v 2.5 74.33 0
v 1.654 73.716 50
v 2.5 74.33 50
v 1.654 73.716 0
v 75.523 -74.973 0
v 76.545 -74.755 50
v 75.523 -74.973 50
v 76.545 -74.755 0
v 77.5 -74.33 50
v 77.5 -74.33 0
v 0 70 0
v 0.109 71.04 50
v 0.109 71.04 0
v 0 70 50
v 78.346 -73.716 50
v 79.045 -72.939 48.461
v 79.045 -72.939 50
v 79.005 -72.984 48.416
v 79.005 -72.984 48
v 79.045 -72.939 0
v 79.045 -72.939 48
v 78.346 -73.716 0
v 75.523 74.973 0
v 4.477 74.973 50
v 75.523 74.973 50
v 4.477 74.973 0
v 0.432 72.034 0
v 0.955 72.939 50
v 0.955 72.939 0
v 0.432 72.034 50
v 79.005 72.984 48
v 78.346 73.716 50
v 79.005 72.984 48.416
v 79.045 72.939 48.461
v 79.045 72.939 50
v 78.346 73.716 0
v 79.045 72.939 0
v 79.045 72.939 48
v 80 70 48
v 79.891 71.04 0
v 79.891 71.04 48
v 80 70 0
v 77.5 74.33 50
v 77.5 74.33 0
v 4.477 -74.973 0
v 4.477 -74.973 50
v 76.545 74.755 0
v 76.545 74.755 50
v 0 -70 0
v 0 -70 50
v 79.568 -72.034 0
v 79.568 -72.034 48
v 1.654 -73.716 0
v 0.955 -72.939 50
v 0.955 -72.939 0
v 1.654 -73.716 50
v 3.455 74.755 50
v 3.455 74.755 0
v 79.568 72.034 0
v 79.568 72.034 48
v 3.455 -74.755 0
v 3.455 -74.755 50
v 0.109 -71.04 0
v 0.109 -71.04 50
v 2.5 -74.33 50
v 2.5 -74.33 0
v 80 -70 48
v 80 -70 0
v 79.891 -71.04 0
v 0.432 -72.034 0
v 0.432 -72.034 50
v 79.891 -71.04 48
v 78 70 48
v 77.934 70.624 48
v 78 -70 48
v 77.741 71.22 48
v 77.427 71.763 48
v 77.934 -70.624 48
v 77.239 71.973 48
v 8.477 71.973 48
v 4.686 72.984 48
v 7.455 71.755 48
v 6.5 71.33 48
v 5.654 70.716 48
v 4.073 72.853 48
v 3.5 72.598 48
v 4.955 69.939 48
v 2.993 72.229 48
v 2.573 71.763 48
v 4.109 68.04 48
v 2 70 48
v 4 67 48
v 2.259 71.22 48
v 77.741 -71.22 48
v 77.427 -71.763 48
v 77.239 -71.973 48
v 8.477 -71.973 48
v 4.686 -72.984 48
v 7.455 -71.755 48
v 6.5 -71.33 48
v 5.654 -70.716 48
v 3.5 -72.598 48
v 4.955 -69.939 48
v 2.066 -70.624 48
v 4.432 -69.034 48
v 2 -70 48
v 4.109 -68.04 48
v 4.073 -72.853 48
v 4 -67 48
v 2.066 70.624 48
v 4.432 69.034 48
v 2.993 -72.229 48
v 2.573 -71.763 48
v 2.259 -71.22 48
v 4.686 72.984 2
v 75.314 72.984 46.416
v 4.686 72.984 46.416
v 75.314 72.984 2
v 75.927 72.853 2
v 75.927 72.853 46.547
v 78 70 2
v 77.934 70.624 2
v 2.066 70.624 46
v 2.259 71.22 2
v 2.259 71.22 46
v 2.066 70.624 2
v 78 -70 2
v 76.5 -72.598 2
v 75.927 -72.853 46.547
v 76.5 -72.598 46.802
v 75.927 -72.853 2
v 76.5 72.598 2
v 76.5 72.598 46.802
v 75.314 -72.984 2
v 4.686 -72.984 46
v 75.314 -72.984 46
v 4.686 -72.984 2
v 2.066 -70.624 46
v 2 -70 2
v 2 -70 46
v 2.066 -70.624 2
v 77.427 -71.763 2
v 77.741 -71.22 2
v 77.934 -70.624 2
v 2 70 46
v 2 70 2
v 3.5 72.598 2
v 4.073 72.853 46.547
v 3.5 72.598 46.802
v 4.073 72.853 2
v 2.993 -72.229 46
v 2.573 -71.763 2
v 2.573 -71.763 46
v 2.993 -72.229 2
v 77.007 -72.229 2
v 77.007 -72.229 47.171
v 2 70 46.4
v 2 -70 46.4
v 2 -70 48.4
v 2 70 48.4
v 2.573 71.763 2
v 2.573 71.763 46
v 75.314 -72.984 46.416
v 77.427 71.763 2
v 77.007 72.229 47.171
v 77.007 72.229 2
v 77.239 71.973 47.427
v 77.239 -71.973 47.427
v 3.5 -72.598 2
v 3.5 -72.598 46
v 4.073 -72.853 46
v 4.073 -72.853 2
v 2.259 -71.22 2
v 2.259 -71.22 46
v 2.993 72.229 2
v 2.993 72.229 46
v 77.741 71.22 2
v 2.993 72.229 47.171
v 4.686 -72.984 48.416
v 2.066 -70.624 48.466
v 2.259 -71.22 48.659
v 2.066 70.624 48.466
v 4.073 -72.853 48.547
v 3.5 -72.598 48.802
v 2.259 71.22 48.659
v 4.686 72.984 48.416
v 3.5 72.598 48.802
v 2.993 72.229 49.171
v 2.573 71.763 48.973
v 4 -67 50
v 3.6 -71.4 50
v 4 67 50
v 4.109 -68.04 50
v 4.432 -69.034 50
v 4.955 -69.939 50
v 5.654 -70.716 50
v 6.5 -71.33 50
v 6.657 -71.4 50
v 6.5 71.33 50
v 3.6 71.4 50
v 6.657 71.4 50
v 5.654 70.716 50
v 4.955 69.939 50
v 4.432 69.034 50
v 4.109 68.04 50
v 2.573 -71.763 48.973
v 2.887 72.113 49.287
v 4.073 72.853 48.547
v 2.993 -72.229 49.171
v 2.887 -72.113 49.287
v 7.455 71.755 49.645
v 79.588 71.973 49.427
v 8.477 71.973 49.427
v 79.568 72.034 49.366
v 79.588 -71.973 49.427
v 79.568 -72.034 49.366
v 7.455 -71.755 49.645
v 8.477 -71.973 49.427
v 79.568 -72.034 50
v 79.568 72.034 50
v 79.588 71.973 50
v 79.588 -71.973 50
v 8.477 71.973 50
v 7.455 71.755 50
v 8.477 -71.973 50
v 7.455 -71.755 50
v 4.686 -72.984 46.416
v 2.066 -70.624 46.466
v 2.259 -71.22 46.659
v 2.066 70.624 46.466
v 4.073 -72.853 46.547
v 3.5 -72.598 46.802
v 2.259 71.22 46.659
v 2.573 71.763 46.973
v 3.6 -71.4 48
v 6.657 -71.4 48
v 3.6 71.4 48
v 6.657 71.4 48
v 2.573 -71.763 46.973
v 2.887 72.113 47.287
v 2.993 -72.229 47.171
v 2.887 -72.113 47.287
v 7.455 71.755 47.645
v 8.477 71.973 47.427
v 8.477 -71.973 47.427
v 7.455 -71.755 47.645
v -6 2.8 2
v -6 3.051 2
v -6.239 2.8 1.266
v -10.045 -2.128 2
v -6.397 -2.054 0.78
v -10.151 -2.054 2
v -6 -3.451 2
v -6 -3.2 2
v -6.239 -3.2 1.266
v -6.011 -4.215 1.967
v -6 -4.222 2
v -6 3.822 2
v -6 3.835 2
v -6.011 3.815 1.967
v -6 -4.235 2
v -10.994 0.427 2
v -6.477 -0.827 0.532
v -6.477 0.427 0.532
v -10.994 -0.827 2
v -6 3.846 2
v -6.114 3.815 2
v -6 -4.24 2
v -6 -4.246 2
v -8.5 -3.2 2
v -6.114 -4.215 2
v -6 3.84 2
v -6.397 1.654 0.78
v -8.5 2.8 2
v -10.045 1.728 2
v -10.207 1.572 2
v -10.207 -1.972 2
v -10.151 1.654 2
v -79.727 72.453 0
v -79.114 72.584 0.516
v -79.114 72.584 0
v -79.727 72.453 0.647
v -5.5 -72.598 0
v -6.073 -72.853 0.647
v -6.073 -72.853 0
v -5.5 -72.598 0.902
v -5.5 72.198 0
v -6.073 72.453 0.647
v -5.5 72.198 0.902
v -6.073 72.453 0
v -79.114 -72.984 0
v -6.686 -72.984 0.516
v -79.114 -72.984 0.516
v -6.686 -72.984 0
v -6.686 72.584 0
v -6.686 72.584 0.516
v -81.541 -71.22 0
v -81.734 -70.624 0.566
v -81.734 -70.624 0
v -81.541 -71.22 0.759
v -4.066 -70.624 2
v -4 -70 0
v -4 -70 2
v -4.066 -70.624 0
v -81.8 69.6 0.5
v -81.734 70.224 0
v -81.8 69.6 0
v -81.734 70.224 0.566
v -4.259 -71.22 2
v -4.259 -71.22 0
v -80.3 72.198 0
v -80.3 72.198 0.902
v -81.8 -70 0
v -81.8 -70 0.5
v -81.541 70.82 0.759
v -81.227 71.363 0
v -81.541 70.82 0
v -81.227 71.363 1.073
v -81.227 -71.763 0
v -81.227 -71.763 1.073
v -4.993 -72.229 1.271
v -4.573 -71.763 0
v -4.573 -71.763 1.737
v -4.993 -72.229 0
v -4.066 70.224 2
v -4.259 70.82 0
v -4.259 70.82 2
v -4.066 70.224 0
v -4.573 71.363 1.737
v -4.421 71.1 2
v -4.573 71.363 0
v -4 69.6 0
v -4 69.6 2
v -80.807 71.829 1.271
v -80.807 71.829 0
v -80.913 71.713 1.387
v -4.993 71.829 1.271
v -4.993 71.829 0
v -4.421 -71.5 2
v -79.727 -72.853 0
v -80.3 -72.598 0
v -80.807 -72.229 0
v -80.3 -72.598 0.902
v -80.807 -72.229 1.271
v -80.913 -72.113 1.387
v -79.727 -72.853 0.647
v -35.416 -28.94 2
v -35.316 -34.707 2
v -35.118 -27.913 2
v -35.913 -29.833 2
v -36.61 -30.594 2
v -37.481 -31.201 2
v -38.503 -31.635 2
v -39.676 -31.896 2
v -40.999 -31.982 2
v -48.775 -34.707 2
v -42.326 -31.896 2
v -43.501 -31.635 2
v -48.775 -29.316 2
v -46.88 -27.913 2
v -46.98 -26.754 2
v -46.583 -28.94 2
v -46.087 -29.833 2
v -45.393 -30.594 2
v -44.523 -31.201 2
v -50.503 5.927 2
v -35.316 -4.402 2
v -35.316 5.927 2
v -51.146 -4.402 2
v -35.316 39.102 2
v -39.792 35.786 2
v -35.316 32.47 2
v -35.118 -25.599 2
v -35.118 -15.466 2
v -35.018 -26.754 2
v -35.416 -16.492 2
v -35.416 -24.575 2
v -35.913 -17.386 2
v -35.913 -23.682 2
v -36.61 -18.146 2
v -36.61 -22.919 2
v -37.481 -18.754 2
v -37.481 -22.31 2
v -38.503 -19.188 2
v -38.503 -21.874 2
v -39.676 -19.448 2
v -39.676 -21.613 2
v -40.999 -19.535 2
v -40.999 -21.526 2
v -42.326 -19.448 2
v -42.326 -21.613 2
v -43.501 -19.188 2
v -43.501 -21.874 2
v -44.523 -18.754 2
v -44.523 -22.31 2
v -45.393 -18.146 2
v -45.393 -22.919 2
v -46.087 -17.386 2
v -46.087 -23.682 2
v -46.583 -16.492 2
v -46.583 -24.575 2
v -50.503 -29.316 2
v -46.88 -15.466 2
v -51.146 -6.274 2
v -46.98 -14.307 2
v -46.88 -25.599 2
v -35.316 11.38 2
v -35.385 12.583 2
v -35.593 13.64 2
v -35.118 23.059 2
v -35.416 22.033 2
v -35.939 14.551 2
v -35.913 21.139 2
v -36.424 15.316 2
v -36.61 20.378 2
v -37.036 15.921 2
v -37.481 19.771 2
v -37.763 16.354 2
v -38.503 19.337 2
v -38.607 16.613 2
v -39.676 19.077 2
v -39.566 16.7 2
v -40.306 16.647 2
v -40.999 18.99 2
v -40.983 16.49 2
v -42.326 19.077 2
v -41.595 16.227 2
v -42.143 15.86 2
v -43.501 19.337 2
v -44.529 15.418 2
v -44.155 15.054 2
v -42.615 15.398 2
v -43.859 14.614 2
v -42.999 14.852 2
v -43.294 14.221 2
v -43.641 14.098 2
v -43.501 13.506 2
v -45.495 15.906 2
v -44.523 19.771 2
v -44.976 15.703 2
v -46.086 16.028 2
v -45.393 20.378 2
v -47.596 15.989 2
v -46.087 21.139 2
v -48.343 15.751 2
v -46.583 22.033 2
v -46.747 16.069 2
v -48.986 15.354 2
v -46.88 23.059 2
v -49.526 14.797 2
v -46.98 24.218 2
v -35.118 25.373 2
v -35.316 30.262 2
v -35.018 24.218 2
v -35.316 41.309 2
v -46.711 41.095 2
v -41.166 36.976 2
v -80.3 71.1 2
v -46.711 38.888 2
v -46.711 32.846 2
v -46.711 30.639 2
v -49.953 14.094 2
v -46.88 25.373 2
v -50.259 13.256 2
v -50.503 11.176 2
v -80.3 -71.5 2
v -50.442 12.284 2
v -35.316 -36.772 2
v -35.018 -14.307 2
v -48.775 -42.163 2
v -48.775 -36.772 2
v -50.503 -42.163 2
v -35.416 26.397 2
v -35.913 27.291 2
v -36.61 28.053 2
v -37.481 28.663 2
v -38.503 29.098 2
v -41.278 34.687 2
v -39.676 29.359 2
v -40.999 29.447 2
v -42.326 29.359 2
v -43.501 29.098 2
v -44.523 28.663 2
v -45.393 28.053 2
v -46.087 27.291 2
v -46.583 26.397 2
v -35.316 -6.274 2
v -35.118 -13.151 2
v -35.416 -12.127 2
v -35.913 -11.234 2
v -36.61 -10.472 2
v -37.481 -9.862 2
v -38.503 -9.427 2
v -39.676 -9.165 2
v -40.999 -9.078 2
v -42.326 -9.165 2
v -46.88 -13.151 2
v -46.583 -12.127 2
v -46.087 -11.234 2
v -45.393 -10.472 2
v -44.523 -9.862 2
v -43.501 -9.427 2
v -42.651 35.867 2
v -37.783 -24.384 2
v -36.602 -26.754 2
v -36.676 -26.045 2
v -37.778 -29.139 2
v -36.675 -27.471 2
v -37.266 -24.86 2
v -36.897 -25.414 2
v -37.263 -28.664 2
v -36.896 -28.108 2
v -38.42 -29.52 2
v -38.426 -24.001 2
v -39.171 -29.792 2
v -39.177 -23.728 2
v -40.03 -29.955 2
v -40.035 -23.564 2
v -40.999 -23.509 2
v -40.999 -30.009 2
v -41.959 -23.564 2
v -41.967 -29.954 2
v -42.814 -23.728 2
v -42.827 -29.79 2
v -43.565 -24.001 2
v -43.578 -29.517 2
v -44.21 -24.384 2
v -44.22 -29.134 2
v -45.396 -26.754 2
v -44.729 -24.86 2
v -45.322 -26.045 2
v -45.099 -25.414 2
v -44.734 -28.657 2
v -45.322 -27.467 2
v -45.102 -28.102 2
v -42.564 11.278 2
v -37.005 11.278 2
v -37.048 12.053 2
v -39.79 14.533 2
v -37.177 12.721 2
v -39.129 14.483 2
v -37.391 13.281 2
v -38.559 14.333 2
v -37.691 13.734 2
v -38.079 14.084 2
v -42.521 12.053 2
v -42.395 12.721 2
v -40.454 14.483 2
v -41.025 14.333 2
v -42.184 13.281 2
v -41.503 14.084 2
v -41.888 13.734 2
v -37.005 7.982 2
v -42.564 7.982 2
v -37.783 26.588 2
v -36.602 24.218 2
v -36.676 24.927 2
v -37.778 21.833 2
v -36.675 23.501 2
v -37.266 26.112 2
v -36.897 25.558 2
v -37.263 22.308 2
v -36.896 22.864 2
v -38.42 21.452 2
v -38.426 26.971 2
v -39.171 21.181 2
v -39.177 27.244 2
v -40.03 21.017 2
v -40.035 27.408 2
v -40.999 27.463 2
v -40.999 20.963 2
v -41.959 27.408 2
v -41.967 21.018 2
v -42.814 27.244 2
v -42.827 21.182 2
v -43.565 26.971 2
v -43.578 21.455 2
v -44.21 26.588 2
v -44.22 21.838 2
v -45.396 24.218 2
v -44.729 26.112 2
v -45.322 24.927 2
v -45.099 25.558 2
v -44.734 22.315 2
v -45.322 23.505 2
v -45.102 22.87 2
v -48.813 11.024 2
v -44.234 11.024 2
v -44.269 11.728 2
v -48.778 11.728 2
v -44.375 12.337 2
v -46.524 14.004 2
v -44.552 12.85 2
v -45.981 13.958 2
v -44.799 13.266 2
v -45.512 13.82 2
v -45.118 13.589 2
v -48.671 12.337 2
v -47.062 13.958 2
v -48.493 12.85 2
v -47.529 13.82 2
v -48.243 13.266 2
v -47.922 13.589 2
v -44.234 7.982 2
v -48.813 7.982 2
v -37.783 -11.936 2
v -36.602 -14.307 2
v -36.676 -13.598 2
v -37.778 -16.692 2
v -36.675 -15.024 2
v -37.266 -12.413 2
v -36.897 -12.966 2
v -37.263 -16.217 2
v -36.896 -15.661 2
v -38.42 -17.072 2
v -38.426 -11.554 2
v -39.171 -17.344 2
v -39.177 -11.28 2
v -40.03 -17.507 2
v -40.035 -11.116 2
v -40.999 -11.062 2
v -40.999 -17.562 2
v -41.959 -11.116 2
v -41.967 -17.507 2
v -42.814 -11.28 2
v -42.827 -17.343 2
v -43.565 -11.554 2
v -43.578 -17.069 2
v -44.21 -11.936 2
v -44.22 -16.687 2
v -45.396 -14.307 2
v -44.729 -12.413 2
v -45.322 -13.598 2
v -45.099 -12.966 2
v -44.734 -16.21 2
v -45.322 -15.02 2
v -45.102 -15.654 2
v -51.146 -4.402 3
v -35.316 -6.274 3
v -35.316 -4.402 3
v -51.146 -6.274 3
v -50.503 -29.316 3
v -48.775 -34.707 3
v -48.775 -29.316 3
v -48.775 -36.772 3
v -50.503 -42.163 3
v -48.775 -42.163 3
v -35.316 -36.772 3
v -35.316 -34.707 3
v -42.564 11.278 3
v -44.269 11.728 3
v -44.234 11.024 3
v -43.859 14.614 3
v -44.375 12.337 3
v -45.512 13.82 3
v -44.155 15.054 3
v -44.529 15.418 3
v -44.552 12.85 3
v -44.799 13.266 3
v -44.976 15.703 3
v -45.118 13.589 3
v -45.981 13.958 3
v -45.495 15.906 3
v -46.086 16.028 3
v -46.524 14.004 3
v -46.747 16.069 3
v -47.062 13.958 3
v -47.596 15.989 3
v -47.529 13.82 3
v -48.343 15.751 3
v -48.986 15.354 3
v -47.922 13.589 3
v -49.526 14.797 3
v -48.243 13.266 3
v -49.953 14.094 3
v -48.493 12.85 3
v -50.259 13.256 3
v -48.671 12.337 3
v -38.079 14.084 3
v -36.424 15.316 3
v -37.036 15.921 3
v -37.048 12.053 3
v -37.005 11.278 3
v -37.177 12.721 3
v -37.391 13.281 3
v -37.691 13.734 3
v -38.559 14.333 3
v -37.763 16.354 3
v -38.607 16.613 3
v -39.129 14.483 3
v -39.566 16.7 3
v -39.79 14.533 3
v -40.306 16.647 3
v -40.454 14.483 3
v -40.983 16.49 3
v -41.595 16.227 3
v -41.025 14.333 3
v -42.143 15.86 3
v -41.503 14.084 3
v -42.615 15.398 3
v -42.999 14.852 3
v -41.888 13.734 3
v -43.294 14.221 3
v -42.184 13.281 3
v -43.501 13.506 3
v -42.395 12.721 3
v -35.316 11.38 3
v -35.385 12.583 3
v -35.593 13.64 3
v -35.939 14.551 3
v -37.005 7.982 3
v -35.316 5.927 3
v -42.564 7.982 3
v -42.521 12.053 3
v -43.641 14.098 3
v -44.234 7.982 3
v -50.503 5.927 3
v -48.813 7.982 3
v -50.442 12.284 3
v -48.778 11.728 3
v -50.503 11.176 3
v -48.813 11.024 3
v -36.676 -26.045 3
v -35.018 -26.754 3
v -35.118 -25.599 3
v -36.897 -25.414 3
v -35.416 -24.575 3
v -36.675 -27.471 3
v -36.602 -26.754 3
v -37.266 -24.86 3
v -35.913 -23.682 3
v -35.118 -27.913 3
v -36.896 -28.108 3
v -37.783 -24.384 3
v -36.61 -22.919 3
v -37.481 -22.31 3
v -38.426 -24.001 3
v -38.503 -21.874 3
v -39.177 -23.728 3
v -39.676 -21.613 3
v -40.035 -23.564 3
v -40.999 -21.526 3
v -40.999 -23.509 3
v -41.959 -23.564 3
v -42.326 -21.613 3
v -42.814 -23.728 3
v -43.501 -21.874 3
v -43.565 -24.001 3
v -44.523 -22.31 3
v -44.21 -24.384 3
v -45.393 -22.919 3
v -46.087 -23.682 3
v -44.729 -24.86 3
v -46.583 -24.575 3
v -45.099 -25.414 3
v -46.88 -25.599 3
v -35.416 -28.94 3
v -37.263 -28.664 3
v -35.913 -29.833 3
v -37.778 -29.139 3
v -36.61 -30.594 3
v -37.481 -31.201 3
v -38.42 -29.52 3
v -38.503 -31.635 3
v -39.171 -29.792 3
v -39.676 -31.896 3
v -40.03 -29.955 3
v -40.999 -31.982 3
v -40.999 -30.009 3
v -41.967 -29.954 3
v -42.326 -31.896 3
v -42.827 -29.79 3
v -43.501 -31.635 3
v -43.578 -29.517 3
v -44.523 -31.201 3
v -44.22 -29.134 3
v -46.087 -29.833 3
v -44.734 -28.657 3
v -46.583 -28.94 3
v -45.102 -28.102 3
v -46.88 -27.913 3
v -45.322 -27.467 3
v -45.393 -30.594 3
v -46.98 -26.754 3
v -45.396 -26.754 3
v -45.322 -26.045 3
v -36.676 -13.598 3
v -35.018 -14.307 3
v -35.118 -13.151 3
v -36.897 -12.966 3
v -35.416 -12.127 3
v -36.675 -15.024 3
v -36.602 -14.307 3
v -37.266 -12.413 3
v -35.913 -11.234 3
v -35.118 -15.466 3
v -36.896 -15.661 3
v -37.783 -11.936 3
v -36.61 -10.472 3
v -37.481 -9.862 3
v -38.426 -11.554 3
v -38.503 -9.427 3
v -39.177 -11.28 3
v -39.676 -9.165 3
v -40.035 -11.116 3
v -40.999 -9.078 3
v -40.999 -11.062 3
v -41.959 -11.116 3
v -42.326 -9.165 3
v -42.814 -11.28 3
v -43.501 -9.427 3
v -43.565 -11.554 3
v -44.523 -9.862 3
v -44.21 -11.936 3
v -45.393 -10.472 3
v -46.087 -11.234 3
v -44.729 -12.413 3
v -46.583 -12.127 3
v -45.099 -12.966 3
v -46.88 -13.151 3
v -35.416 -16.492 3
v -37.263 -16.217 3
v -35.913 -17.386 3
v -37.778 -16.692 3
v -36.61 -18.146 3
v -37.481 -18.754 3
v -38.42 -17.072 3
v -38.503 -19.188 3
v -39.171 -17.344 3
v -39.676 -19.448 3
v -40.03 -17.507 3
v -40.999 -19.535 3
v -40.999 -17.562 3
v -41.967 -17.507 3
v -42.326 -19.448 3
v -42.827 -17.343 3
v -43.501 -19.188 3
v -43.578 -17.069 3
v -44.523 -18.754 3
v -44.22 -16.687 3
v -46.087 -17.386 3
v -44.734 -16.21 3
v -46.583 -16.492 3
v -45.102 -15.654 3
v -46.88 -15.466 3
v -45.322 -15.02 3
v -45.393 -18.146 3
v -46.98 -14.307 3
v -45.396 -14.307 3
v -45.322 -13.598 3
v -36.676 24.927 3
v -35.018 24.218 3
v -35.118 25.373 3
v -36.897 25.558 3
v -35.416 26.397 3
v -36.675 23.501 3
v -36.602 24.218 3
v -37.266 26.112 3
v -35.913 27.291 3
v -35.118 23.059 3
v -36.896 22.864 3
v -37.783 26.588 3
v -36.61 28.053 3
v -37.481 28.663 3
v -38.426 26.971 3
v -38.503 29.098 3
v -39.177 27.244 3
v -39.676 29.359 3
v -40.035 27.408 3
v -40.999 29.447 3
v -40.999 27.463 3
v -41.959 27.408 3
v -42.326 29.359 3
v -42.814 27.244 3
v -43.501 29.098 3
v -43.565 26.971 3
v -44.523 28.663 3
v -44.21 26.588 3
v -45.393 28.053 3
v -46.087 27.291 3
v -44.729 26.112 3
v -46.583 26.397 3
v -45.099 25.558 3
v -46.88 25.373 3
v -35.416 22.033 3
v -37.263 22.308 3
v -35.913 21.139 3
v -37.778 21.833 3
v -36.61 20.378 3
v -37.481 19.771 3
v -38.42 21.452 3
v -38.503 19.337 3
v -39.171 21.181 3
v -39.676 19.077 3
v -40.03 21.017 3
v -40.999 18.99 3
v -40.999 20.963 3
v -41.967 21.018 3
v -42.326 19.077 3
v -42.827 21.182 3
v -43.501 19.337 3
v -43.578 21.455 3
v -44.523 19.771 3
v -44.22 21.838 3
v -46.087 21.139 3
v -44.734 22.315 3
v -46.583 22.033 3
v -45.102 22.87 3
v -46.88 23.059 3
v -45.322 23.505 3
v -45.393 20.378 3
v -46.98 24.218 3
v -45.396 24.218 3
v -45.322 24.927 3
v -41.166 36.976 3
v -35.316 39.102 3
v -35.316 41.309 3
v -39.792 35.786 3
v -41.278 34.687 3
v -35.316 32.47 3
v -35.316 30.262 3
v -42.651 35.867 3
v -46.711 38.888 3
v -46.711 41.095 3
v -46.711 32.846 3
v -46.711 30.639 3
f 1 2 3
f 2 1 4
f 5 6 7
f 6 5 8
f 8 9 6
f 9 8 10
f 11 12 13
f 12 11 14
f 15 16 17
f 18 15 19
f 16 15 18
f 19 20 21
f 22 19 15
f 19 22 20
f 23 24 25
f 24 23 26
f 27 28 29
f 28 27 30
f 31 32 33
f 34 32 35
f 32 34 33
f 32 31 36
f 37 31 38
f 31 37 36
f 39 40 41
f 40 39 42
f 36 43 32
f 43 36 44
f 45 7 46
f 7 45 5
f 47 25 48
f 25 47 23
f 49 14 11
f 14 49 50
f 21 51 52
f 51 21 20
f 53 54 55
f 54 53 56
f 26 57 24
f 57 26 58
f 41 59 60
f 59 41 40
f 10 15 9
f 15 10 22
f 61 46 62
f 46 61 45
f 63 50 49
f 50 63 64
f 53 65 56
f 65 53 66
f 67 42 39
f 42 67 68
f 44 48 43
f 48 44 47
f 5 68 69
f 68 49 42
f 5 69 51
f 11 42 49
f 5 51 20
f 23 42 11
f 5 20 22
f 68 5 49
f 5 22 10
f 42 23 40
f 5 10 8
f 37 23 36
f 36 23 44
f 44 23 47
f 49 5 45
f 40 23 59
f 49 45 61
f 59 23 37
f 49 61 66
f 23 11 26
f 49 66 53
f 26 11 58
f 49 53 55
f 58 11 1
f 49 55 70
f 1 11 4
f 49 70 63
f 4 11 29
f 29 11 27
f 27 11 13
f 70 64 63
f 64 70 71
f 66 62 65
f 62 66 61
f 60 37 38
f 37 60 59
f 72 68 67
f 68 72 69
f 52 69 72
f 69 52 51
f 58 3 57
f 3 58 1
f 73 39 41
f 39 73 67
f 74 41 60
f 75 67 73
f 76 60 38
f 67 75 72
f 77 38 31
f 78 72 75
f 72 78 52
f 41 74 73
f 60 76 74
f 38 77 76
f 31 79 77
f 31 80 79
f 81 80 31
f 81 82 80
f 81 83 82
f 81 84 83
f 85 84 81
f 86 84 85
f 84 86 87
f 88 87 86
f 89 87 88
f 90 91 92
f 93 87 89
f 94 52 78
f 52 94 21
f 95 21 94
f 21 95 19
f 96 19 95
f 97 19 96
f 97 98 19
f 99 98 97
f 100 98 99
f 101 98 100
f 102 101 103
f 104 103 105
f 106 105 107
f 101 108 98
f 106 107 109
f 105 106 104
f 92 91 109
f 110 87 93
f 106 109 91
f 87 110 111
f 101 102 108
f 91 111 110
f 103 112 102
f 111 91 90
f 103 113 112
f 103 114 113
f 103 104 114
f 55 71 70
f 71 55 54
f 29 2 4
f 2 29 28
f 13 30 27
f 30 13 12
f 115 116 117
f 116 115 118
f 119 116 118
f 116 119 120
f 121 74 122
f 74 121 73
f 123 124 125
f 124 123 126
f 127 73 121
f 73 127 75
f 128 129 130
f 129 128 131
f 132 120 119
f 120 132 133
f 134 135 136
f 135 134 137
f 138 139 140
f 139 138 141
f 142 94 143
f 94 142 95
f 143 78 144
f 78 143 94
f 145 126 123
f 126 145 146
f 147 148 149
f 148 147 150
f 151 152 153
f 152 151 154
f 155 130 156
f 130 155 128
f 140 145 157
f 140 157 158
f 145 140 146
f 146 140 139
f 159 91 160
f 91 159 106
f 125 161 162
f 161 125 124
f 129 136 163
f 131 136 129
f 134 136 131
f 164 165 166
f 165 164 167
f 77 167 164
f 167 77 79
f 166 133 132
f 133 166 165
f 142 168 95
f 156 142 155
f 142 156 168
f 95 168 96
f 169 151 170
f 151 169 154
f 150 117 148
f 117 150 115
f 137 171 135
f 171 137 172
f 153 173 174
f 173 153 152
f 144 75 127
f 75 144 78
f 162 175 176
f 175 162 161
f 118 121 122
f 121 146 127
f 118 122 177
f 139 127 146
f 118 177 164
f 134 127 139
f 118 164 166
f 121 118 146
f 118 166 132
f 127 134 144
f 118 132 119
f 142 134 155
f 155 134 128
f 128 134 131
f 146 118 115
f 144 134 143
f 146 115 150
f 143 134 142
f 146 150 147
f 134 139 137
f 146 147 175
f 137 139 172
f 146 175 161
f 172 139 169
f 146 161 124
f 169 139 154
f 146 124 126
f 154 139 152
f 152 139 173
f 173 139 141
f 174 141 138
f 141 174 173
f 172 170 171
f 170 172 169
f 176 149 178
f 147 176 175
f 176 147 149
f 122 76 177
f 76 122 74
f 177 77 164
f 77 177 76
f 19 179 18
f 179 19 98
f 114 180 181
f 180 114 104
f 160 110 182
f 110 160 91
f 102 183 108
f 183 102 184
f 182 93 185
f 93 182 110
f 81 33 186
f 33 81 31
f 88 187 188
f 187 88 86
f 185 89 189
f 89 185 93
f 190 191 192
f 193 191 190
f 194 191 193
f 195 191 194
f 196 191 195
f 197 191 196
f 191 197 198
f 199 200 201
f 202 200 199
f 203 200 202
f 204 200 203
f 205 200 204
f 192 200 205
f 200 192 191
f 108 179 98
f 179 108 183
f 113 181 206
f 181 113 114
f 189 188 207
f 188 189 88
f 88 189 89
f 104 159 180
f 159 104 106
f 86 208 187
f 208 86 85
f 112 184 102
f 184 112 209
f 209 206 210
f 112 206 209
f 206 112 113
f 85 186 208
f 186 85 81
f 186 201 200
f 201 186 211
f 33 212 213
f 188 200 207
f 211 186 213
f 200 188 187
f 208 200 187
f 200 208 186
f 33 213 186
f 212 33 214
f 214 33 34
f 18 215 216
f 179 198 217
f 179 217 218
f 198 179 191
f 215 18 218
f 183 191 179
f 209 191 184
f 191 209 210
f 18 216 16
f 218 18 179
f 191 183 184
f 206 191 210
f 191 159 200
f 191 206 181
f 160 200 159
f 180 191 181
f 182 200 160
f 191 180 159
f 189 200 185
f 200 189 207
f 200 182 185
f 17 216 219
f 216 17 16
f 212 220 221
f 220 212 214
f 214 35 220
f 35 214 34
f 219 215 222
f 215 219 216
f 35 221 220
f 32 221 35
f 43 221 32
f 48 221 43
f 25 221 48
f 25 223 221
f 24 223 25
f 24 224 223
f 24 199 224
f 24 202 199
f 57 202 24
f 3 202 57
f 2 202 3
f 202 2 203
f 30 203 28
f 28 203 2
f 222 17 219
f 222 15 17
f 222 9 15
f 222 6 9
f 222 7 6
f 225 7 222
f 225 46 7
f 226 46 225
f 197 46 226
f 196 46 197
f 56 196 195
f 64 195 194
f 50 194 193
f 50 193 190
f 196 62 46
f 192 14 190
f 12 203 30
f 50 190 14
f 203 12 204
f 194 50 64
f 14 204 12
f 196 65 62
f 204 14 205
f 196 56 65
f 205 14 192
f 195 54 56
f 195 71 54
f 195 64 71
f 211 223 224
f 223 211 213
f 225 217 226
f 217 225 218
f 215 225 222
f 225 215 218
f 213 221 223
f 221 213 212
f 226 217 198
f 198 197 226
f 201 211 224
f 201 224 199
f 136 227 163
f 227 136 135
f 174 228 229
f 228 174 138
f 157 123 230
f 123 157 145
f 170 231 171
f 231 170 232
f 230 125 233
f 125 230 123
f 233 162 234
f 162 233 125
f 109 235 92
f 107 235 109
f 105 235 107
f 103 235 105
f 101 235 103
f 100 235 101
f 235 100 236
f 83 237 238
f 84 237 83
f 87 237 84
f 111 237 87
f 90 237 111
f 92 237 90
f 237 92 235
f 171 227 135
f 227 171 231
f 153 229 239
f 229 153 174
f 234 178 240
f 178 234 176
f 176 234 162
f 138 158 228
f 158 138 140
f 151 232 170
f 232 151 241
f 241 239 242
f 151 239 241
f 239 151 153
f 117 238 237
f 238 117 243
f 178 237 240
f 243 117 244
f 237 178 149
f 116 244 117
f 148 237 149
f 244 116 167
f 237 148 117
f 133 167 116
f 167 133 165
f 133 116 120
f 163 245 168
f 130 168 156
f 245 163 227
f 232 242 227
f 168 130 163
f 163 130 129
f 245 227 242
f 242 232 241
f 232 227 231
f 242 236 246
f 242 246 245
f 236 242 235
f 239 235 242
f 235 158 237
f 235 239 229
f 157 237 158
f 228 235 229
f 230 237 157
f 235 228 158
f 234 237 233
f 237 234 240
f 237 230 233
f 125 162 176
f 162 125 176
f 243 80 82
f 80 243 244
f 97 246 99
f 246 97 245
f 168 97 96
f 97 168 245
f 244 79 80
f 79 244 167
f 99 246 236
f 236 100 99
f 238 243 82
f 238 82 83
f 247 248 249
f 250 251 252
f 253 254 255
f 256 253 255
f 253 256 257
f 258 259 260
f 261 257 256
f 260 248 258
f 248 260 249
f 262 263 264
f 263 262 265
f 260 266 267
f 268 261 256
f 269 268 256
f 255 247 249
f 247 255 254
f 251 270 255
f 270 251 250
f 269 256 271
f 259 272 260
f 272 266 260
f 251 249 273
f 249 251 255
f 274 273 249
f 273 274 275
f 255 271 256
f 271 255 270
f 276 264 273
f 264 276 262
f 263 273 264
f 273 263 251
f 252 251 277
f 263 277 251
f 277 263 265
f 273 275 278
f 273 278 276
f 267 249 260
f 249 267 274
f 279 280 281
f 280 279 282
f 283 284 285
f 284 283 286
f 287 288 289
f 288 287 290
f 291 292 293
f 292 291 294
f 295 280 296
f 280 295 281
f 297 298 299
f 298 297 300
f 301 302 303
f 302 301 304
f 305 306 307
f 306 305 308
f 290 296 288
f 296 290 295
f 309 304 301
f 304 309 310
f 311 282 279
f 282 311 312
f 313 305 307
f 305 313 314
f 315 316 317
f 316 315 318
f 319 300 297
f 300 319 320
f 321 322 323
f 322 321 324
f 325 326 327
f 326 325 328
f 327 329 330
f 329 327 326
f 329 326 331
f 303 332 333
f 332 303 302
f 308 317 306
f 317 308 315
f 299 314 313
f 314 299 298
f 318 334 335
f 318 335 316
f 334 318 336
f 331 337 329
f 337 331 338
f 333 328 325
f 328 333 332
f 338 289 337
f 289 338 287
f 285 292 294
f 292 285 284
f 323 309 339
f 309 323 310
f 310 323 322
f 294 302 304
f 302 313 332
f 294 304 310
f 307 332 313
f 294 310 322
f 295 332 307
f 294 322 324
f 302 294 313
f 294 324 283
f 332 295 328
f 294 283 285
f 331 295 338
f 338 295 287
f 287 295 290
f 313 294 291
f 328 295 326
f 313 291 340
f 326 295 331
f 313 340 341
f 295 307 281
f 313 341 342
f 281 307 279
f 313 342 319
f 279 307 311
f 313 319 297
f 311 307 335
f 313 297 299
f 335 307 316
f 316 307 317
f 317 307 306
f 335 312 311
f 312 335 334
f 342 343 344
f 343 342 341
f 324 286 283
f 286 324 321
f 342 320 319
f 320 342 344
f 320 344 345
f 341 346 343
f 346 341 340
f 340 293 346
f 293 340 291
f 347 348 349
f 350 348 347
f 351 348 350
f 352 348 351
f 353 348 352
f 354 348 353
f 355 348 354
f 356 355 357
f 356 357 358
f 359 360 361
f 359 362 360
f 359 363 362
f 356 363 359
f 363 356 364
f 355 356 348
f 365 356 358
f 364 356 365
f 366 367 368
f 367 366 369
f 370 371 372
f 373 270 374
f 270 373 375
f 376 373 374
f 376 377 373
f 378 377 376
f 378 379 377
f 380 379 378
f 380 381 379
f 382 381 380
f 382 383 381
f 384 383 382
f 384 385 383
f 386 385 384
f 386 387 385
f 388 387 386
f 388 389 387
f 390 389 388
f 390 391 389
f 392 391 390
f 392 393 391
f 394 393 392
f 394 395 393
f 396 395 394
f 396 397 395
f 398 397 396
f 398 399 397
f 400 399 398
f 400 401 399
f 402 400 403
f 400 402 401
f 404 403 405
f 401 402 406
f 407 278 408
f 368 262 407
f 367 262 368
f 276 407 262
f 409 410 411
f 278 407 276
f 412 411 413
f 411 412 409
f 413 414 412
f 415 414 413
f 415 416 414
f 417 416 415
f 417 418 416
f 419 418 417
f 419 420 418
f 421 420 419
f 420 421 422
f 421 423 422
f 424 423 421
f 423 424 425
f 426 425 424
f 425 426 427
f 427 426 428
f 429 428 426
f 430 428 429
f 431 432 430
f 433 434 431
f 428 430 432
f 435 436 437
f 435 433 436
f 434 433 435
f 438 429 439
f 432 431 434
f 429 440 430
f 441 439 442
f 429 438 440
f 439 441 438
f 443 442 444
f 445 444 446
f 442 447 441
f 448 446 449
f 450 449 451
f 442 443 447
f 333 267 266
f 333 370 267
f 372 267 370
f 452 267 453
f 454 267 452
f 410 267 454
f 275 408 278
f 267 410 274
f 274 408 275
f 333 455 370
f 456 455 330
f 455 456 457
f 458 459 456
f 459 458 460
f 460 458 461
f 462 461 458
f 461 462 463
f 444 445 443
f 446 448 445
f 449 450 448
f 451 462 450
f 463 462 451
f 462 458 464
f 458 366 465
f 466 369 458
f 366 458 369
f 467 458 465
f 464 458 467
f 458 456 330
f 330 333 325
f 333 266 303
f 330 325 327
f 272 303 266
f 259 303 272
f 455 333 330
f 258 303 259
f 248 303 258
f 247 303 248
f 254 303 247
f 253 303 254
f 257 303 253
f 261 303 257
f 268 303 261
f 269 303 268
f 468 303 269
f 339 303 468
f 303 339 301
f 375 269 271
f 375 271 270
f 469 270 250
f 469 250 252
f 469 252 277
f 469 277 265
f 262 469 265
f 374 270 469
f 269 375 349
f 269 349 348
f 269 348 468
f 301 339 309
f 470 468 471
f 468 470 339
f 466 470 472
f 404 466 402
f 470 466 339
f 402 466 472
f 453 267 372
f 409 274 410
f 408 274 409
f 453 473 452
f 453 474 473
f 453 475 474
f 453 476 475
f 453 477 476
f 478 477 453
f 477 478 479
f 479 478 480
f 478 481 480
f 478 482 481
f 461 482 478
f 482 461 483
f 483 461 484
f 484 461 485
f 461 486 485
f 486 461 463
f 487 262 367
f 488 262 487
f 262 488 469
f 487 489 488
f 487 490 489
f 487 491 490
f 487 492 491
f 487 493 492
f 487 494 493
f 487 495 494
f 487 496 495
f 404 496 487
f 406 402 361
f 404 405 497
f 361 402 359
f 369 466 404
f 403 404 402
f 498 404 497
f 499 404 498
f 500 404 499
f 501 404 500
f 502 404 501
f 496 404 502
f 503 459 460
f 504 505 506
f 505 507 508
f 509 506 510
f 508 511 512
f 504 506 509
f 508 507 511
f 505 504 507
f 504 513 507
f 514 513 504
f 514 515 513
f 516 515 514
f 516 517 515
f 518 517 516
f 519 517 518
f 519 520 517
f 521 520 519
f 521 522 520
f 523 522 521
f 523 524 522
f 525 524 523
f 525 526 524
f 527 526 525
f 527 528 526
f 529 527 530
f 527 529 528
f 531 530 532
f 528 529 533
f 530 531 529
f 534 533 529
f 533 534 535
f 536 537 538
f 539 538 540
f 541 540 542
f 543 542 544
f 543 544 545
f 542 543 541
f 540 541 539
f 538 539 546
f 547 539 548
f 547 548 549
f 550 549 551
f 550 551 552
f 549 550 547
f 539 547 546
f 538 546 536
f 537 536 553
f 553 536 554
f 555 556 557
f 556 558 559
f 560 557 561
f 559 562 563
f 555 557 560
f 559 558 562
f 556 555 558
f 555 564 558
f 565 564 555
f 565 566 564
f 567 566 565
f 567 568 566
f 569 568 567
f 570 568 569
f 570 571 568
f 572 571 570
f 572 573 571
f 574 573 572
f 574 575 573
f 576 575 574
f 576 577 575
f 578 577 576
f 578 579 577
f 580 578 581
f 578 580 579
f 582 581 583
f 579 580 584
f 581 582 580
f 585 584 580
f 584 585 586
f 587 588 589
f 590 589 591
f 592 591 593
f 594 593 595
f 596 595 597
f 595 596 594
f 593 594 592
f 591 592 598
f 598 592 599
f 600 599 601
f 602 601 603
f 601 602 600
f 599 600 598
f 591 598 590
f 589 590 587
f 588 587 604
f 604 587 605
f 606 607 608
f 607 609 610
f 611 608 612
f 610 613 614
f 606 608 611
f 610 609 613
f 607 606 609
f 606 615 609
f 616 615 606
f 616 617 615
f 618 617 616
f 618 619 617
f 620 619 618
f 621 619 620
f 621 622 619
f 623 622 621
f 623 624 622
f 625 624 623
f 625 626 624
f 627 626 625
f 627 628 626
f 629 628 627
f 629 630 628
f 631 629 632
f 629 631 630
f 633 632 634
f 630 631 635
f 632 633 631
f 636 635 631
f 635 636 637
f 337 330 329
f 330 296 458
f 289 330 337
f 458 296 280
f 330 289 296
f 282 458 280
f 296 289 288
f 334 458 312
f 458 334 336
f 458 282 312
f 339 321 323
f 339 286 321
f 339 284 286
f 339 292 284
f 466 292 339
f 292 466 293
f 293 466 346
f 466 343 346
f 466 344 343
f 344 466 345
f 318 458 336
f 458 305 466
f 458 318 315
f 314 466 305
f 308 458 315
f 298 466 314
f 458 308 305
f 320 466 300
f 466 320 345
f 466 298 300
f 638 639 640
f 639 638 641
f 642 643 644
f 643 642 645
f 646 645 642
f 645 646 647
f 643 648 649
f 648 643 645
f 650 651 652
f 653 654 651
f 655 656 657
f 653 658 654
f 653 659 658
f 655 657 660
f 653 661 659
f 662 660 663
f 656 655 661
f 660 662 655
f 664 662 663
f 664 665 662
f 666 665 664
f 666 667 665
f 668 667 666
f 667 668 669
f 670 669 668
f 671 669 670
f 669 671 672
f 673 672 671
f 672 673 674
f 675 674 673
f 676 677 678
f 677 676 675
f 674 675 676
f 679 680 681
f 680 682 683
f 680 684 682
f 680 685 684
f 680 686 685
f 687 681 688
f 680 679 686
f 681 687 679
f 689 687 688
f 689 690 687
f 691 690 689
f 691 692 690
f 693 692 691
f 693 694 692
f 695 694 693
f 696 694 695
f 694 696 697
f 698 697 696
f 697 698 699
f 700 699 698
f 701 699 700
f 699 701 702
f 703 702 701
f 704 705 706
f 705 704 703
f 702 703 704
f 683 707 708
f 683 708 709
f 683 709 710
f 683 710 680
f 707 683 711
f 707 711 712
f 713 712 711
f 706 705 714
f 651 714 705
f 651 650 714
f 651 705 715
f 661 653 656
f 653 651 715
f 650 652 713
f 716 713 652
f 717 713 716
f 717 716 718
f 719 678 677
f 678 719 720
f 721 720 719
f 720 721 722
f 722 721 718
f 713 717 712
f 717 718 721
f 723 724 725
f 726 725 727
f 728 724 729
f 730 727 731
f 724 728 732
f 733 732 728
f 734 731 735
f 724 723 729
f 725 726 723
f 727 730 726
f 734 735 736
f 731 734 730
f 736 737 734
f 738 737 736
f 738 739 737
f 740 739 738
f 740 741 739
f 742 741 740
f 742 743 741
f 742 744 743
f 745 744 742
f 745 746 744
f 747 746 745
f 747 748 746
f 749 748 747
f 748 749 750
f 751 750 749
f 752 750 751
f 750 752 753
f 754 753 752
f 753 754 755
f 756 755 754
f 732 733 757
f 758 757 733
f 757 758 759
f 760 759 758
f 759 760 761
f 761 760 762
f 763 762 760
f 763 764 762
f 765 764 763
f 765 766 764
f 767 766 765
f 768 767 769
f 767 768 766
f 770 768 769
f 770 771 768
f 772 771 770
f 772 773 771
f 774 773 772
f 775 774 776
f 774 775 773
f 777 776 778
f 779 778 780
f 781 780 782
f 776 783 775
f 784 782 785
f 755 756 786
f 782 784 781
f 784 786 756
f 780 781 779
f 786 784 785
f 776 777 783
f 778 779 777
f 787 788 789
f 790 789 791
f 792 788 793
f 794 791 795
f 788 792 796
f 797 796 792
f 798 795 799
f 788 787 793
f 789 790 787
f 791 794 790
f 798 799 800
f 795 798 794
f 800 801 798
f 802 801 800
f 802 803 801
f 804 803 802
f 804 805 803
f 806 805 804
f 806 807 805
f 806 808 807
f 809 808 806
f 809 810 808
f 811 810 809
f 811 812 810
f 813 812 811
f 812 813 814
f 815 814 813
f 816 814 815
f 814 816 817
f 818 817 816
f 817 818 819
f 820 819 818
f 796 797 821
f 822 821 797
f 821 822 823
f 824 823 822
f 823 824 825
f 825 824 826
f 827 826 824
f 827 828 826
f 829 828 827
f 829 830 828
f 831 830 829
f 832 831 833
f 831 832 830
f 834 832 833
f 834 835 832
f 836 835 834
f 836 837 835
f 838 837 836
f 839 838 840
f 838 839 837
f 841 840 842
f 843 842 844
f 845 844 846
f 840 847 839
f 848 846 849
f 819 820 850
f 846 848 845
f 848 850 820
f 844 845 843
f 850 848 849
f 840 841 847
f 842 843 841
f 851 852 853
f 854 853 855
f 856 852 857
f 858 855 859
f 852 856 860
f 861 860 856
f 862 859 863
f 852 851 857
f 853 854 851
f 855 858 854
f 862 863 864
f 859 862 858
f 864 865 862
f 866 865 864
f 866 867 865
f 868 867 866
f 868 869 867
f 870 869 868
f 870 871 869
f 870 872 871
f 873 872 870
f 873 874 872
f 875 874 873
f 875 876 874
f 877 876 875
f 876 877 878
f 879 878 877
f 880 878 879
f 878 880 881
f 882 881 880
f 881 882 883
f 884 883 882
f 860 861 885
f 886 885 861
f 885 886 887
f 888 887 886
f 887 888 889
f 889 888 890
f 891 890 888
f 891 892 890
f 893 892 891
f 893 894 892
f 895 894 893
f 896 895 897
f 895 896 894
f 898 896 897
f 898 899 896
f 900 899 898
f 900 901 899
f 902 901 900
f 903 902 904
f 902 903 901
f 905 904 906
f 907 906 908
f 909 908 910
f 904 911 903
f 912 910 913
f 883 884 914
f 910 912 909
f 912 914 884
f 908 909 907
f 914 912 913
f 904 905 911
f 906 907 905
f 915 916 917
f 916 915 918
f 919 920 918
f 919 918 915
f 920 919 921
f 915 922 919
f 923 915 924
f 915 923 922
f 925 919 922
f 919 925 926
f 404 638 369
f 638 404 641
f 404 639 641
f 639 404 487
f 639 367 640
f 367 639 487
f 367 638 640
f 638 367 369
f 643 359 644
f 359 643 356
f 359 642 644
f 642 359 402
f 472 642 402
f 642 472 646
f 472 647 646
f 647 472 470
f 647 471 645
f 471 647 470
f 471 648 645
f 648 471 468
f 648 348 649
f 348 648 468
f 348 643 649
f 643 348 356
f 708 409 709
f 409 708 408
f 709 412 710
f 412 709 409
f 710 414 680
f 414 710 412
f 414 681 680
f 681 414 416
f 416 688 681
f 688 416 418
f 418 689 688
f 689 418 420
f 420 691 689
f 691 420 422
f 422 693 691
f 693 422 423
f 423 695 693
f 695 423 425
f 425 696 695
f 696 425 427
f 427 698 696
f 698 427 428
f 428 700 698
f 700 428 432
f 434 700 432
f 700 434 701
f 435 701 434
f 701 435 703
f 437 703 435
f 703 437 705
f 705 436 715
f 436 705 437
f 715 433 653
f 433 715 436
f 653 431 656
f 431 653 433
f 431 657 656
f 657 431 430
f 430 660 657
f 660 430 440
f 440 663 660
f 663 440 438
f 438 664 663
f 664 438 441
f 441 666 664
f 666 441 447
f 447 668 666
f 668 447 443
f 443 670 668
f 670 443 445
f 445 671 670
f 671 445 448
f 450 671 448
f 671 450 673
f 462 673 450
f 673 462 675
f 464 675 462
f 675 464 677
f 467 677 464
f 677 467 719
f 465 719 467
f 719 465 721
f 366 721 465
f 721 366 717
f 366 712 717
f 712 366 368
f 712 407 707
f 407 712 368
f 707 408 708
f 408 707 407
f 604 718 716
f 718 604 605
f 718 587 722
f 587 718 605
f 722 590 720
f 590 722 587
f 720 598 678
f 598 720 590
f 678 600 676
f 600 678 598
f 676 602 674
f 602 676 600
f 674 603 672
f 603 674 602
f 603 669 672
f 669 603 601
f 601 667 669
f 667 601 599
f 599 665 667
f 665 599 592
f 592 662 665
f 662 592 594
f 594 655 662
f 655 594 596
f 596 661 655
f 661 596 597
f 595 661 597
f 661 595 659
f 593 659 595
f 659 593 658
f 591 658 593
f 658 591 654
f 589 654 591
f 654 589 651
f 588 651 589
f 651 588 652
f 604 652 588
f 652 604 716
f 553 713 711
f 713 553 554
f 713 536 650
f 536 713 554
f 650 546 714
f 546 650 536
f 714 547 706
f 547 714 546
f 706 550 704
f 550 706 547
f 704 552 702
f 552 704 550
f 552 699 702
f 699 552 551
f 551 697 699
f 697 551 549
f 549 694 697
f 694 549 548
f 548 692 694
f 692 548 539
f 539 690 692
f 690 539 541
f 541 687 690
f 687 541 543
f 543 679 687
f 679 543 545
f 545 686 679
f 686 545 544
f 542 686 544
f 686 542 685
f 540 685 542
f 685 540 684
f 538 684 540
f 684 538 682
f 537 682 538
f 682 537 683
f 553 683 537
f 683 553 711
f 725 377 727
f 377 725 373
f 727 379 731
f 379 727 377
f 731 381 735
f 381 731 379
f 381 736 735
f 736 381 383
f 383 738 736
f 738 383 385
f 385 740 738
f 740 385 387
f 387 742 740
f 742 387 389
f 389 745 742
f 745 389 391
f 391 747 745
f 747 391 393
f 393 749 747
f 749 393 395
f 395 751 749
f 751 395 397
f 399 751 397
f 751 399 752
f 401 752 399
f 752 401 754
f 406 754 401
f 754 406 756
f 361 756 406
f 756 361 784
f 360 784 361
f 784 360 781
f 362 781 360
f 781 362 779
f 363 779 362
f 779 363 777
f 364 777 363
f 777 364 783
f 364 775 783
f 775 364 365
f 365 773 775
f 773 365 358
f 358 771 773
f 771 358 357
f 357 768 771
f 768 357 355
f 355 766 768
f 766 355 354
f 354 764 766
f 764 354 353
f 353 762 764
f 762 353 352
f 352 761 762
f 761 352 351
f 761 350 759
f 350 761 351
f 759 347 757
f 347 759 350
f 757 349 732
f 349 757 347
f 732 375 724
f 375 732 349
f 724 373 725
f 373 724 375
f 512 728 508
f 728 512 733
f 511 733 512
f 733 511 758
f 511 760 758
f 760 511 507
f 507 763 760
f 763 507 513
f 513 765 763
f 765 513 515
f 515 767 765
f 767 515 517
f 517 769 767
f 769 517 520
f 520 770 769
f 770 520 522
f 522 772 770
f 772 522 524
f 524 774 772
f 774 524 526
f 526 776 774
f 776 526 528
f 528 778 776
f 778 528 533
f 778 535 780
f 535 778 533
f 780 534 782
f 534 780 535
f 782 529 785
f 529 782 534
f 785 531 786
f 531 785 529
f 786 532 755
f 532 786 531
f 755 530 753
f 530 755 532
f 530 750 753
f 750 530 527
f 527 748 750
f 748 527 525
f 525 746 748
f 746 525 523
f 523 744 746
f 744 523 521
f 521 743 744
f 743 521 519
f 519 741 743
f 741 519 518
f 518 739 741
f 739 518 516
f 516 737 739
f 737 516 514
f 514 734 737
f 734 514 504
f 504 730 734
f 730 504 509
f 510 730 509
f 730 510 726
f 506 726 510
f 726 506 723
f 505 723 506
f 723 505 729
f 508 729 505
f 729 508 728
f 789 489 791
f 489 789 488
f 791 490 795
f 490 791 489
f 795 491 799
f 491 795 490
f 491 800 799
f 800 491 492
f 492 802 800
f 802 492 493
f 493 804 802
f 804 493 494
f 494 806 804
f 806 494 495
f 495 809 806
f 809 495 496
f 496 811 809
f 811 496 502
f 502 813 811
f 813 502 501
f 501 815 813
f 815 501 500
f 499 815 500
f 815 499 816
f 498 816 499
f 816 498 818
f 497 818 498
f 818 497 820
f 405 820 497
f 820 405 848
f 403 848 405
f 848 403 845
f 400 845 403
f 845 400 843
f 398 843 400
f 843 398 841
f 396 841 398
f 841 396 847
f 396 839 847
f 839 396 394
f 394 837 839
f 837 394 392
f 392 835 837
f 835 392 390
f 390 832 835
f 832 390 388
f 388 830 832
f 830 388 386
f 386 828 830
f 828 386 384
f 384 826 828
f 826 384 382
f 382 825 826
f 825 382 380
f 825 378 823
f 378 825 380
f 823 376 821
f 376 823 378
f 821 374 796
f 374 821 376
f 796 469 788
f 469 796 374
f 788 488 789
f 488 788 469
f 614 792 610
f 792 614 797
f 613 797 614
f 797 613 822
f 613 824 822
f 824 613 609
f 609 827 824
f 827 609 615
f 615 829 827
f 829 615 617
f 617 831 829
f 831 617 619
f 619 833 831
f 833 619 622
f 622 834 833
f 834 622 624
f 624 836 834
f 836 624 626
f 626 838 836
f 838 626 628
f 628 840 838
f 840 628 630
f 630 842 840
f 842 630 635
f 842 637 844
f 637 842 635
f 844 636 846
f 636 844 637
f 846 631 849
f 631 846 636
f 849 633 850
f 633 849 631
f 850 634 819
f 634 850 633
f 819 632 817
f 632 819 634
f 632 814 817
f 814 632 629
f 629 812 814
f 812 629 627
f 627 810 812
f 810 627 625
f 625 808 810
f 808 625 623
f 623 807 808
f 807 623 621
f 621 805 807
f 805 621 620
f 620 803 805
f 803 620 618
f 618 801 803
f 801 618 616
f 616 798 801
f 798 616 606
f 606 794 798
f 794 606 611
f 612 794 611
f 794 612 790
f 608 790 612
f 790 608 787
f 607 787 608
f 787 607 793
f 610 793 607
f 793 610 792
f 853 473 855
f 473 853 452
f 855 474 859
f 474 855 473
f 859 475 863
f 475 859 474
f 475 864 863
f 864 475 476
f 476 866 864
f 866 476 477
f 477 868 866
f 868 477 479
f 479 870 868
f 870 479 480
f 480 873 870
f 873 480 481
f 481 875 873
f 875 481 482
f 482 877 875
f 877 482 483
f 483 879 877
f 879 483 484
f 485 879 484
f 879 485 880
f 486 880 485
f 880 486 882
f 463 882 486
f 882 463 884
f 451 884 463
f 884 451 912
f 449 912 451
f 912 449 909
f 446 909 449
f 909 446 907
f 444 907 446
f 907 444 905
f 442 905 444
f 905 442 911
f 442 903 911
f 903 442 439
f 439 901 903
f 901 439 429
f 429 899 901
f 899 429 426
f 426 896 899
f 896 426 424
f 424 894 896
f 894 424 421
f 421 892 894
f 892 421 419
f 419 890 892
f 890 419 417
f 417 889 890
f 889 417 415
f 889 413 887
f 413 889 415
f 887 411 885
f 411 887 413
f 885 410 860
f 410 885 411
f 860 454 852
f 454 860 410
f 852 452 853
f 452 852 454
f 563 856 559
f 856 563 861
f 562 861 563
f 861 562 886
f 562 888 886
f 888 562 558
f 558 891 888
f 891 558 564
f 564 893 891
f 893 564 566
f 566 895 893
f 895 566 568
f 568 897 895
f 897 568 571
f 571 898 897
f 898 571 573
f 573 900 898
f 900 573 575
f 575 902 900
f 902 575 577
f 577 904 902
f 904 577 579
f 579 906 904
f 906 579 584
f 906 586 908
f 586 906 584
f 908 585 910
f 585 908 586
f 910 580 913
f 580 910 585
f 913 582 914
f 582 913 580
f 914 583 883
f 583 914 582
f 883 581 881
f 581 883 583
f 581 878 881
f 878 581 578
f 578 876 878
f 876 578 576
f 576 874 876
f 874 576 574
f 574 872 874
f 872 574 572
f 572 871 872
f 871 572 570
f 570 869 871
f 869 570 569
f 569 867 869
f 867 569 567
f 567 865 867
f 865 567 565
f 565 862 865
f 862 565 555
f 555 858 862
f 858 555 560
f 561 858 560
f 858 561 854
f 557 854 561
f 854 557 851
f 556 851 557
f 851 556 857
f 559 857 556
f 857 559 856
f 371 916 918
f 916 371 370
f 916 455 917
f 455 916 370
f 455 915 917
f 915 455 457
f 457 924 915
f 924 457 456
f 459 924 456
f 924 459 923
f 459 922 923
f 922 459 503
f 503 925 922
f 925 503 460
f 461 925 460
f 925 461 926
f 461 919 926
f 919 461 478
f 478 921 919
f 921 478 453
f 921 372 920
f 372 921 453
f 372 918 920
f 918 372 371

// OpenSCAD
// Forked from:
// https://www.thingiverse.com/thing:189264 by @Arvin

// Also inspired by:
// https://makerworld.com/en/models/14225 by @MadMax3D

// License: CC-Attribution

/* [Box Variables] */
itemsShown="both"; // [both,box,lid]

boxLength=80; // [10:0.1:200]
boxWidth=150; // [10:0.1:200]
boxHeight=50; // [10:0.1:200]

lidColor = "#FFFFFF"; // color
lidContentColor = "#FFFFFF"; // color
boxColor = "#FFFFFF"; // color
lidContent = "text"; // [text,png,svg]
rotateLidContent = true; // true;
// Notch in the lid
withNotch=true;//true;//[true:false]

/* [ Other Dimensions ] */
cornerRadius=5; // [0:0.1:10]
wallThickness=2; // [0.8:0.05:10]
bottomThickness=2; // [0.8:0.05:10]
lidThickness=2; // [0.8:0.05:10]

/* [ Text Options ] */
text="Tool Box";
textSize=15; // [5:1:50]
textThickness=1; // [0.4:0.05:10]

/* [ PNG Options] */
// !Avoid using complicating image!
pngFile = "default.png";
pngScale = [0.15, 0.15, 0.02]; //[0:0.01:1]

/* [ SVG Options] */
svgFile = "default.svg";
svgThickness=2; // [0.4:0.05:10]
svgScale = 0.3; //[0.01:0.1:50]


/* [Others] */
lidEdgeThickness=0.5;
topClearance=0.2;


/* [Global] */
if (itemsShown=="box") showBox();
if (itemsShown=="lid") showLid();
if (itemsShown=="both"){showBox();showLid();}


module showLid(){
	translateX = (boxLength>boxWidth)?-boxLength/2:(-2*wallThickness);
	translateY = (boxLength>boxWidth)?(-2*wallThickness):wallThickness-boxWidth/2;
	
	translate ([translateX, translateY, 0]) 
	roundBoxLid(l=boxLength-wallThickness-topClearance,
				w=boxWidth-2*wallThickness-2*topClearance,
				h=lidThickness,
				et=lidEdgeThickness,
				r=cornerRadius-wallThickness,
				dynamicPos=true, showContent=true);
}

module showBox(){
	color(boxColor) {
		translateX = (boxLength>boxWidth)?-boxLength/2:0;
		translateY = (boxLength>boxWidth)?0:-boxWidth/2;

		translate([translateX , translateY, 0])
		round_box(l=boxLength,
				w=boxWidth,
				h=boxHeight,
				bt=bottomThickness,
				wt=wallThickness,
				lt=lidThickness,
				r=cornerRadius);
	}
}

module round_box(l=40,w=30,h=30,bt=2,wt=2,tc=0.2,lt=2,r=5){
	difference() { 
		round_cube(l=l,w=w,h=h-lt,r=r);
		translate ([wt, wt, bt]) 
		round_cube(l=l-wt*2,w=w-wt*2,h=h,r=r-wt);
	}
	//use a second box rim to support the lid
	roundBoxRim();
	translate ([0, 0, -wt]) roundBoxRim();
}

module roundBoxRim(l=boxLength,
				   w=boxWidth,
				   h=boxHeight,
				   et=lidEdgeThickness,
				   r=cornerRadius,
				   wt=wallThickness,
				   lt=lidThickness)
{
	difference() { 
		translate ([0, 0, h-lt]) 
		round_cube(l=l,w=w,h=lt,r=r);
		translate ([wt+lt,wt+lt-et*2,h-lt-0.1]) 
		round_cube(l=l*2,w=w-2*(wt+lt)+4*et,h=lt+0.2,r=r-wt+lt);

		//subtract out a lid to make the ledge
		translate ([wt, w-wt, h-lt-0.1])
		roundBoxLid(l=l*2,w=w-2*wt,h=lt+0.1,tc=0.0,et=lidEdgeThickness,r=r-wt,notch=false, showContent=false);
	}                       
}

module generateLidContent() {
	if (lidContent=="text")
		linear_extrude(height = textThickness)
				text(text, size = textSize, font = "HarmonyOS Sans SC:style=Black", halign = "center", valign = "center");
	else if (lidContent=="png")
		scale([pngScale[0], pngScale[1], pngScale[2]])
				surface(file = pngFile, center = true, invert = false);
	else
		scale(svgScale, svgScale, svgScale)
				linear_extrude(height = svgThickness / svgScale) import(file = svgFile, center = true);
}

module roundBoxLid(l=40,w=30,h=3,et=0.5,r=5,notch=withNotch, dynamicPos=false, showContent=true){
	translateX = dynamicPos ? (boxLength > boxWidth ? l : 0) : l;
	translateY = dynamicPos ? (boxLength > boxWidth ? 0 : w) : 0;

	translate ([translateX, translateY, 0]) 
	rotate (a = [0, 0, 180]){ 
		color(lidColor)
			difference(){
				round_cube(l=l,w=w,h=h,r=r);
				//slice angled edges off but leave an edge greater than zero
				translate ([-1, 0, et]) rotate (a = [45, 0, 0])  cube (size = [l+2, h*2, h*2]); 
				translate ([-1, w, et]) rotate (a = [45, 0, 0])  cube (size = [l+2, h*2, h*2]); 
				translate ([l, -1, et]) rotate (a = [45, 0, 90]) cube (size = [w+2, h*2, h*2]); 
				if (notch==true){
					translate([2,w/2,h+0.001]) thumbNotch(notchHeight=h-0.5);
				}
			}
		color(lidContentColor)
			translate([ l / 2, w / 2, h ]) {
			if (rotateLidContent)
				rotate([ 0, 0, -90 ])
				generateLidContent();
			else
				generateLidContent();
			}
	}
}

//thumbNotch(thumbR=12/2,angle=72,notchHeight=1.5);
module thumbNotch(
	thumbR=12/2,
	angle=72,
	notchHeight=2)
{
	size=10*thumbR;

	rotate([0,0,90])
	difference(){
		translate([0,
				  (thumbR*sin(angle)-notchHeight)/tan(angle),
				   thumbR*sin(angle)-notchHeight])
		rotate([angle,0,0])
		cylinder(r=thumbR,h=size,$fn=30);

		translate([-size,-size,0])
		cube(size*2);
	}
}

//round_cube();
module round_cube(l=40,w=30,h=20,r=5, $fn=30){
	hull () { 
		translate ([r, r, 0]) cylinder (h = h, r=r);
		translate ([r, w-r, 0]) cylinder (h = h, r=r);
		translate ([l-r,w-r, 0]) cylinder (h = h, r=r);
		translate ([l-r, r, 0]) cylinder (h = h, r=r);
	}
}
